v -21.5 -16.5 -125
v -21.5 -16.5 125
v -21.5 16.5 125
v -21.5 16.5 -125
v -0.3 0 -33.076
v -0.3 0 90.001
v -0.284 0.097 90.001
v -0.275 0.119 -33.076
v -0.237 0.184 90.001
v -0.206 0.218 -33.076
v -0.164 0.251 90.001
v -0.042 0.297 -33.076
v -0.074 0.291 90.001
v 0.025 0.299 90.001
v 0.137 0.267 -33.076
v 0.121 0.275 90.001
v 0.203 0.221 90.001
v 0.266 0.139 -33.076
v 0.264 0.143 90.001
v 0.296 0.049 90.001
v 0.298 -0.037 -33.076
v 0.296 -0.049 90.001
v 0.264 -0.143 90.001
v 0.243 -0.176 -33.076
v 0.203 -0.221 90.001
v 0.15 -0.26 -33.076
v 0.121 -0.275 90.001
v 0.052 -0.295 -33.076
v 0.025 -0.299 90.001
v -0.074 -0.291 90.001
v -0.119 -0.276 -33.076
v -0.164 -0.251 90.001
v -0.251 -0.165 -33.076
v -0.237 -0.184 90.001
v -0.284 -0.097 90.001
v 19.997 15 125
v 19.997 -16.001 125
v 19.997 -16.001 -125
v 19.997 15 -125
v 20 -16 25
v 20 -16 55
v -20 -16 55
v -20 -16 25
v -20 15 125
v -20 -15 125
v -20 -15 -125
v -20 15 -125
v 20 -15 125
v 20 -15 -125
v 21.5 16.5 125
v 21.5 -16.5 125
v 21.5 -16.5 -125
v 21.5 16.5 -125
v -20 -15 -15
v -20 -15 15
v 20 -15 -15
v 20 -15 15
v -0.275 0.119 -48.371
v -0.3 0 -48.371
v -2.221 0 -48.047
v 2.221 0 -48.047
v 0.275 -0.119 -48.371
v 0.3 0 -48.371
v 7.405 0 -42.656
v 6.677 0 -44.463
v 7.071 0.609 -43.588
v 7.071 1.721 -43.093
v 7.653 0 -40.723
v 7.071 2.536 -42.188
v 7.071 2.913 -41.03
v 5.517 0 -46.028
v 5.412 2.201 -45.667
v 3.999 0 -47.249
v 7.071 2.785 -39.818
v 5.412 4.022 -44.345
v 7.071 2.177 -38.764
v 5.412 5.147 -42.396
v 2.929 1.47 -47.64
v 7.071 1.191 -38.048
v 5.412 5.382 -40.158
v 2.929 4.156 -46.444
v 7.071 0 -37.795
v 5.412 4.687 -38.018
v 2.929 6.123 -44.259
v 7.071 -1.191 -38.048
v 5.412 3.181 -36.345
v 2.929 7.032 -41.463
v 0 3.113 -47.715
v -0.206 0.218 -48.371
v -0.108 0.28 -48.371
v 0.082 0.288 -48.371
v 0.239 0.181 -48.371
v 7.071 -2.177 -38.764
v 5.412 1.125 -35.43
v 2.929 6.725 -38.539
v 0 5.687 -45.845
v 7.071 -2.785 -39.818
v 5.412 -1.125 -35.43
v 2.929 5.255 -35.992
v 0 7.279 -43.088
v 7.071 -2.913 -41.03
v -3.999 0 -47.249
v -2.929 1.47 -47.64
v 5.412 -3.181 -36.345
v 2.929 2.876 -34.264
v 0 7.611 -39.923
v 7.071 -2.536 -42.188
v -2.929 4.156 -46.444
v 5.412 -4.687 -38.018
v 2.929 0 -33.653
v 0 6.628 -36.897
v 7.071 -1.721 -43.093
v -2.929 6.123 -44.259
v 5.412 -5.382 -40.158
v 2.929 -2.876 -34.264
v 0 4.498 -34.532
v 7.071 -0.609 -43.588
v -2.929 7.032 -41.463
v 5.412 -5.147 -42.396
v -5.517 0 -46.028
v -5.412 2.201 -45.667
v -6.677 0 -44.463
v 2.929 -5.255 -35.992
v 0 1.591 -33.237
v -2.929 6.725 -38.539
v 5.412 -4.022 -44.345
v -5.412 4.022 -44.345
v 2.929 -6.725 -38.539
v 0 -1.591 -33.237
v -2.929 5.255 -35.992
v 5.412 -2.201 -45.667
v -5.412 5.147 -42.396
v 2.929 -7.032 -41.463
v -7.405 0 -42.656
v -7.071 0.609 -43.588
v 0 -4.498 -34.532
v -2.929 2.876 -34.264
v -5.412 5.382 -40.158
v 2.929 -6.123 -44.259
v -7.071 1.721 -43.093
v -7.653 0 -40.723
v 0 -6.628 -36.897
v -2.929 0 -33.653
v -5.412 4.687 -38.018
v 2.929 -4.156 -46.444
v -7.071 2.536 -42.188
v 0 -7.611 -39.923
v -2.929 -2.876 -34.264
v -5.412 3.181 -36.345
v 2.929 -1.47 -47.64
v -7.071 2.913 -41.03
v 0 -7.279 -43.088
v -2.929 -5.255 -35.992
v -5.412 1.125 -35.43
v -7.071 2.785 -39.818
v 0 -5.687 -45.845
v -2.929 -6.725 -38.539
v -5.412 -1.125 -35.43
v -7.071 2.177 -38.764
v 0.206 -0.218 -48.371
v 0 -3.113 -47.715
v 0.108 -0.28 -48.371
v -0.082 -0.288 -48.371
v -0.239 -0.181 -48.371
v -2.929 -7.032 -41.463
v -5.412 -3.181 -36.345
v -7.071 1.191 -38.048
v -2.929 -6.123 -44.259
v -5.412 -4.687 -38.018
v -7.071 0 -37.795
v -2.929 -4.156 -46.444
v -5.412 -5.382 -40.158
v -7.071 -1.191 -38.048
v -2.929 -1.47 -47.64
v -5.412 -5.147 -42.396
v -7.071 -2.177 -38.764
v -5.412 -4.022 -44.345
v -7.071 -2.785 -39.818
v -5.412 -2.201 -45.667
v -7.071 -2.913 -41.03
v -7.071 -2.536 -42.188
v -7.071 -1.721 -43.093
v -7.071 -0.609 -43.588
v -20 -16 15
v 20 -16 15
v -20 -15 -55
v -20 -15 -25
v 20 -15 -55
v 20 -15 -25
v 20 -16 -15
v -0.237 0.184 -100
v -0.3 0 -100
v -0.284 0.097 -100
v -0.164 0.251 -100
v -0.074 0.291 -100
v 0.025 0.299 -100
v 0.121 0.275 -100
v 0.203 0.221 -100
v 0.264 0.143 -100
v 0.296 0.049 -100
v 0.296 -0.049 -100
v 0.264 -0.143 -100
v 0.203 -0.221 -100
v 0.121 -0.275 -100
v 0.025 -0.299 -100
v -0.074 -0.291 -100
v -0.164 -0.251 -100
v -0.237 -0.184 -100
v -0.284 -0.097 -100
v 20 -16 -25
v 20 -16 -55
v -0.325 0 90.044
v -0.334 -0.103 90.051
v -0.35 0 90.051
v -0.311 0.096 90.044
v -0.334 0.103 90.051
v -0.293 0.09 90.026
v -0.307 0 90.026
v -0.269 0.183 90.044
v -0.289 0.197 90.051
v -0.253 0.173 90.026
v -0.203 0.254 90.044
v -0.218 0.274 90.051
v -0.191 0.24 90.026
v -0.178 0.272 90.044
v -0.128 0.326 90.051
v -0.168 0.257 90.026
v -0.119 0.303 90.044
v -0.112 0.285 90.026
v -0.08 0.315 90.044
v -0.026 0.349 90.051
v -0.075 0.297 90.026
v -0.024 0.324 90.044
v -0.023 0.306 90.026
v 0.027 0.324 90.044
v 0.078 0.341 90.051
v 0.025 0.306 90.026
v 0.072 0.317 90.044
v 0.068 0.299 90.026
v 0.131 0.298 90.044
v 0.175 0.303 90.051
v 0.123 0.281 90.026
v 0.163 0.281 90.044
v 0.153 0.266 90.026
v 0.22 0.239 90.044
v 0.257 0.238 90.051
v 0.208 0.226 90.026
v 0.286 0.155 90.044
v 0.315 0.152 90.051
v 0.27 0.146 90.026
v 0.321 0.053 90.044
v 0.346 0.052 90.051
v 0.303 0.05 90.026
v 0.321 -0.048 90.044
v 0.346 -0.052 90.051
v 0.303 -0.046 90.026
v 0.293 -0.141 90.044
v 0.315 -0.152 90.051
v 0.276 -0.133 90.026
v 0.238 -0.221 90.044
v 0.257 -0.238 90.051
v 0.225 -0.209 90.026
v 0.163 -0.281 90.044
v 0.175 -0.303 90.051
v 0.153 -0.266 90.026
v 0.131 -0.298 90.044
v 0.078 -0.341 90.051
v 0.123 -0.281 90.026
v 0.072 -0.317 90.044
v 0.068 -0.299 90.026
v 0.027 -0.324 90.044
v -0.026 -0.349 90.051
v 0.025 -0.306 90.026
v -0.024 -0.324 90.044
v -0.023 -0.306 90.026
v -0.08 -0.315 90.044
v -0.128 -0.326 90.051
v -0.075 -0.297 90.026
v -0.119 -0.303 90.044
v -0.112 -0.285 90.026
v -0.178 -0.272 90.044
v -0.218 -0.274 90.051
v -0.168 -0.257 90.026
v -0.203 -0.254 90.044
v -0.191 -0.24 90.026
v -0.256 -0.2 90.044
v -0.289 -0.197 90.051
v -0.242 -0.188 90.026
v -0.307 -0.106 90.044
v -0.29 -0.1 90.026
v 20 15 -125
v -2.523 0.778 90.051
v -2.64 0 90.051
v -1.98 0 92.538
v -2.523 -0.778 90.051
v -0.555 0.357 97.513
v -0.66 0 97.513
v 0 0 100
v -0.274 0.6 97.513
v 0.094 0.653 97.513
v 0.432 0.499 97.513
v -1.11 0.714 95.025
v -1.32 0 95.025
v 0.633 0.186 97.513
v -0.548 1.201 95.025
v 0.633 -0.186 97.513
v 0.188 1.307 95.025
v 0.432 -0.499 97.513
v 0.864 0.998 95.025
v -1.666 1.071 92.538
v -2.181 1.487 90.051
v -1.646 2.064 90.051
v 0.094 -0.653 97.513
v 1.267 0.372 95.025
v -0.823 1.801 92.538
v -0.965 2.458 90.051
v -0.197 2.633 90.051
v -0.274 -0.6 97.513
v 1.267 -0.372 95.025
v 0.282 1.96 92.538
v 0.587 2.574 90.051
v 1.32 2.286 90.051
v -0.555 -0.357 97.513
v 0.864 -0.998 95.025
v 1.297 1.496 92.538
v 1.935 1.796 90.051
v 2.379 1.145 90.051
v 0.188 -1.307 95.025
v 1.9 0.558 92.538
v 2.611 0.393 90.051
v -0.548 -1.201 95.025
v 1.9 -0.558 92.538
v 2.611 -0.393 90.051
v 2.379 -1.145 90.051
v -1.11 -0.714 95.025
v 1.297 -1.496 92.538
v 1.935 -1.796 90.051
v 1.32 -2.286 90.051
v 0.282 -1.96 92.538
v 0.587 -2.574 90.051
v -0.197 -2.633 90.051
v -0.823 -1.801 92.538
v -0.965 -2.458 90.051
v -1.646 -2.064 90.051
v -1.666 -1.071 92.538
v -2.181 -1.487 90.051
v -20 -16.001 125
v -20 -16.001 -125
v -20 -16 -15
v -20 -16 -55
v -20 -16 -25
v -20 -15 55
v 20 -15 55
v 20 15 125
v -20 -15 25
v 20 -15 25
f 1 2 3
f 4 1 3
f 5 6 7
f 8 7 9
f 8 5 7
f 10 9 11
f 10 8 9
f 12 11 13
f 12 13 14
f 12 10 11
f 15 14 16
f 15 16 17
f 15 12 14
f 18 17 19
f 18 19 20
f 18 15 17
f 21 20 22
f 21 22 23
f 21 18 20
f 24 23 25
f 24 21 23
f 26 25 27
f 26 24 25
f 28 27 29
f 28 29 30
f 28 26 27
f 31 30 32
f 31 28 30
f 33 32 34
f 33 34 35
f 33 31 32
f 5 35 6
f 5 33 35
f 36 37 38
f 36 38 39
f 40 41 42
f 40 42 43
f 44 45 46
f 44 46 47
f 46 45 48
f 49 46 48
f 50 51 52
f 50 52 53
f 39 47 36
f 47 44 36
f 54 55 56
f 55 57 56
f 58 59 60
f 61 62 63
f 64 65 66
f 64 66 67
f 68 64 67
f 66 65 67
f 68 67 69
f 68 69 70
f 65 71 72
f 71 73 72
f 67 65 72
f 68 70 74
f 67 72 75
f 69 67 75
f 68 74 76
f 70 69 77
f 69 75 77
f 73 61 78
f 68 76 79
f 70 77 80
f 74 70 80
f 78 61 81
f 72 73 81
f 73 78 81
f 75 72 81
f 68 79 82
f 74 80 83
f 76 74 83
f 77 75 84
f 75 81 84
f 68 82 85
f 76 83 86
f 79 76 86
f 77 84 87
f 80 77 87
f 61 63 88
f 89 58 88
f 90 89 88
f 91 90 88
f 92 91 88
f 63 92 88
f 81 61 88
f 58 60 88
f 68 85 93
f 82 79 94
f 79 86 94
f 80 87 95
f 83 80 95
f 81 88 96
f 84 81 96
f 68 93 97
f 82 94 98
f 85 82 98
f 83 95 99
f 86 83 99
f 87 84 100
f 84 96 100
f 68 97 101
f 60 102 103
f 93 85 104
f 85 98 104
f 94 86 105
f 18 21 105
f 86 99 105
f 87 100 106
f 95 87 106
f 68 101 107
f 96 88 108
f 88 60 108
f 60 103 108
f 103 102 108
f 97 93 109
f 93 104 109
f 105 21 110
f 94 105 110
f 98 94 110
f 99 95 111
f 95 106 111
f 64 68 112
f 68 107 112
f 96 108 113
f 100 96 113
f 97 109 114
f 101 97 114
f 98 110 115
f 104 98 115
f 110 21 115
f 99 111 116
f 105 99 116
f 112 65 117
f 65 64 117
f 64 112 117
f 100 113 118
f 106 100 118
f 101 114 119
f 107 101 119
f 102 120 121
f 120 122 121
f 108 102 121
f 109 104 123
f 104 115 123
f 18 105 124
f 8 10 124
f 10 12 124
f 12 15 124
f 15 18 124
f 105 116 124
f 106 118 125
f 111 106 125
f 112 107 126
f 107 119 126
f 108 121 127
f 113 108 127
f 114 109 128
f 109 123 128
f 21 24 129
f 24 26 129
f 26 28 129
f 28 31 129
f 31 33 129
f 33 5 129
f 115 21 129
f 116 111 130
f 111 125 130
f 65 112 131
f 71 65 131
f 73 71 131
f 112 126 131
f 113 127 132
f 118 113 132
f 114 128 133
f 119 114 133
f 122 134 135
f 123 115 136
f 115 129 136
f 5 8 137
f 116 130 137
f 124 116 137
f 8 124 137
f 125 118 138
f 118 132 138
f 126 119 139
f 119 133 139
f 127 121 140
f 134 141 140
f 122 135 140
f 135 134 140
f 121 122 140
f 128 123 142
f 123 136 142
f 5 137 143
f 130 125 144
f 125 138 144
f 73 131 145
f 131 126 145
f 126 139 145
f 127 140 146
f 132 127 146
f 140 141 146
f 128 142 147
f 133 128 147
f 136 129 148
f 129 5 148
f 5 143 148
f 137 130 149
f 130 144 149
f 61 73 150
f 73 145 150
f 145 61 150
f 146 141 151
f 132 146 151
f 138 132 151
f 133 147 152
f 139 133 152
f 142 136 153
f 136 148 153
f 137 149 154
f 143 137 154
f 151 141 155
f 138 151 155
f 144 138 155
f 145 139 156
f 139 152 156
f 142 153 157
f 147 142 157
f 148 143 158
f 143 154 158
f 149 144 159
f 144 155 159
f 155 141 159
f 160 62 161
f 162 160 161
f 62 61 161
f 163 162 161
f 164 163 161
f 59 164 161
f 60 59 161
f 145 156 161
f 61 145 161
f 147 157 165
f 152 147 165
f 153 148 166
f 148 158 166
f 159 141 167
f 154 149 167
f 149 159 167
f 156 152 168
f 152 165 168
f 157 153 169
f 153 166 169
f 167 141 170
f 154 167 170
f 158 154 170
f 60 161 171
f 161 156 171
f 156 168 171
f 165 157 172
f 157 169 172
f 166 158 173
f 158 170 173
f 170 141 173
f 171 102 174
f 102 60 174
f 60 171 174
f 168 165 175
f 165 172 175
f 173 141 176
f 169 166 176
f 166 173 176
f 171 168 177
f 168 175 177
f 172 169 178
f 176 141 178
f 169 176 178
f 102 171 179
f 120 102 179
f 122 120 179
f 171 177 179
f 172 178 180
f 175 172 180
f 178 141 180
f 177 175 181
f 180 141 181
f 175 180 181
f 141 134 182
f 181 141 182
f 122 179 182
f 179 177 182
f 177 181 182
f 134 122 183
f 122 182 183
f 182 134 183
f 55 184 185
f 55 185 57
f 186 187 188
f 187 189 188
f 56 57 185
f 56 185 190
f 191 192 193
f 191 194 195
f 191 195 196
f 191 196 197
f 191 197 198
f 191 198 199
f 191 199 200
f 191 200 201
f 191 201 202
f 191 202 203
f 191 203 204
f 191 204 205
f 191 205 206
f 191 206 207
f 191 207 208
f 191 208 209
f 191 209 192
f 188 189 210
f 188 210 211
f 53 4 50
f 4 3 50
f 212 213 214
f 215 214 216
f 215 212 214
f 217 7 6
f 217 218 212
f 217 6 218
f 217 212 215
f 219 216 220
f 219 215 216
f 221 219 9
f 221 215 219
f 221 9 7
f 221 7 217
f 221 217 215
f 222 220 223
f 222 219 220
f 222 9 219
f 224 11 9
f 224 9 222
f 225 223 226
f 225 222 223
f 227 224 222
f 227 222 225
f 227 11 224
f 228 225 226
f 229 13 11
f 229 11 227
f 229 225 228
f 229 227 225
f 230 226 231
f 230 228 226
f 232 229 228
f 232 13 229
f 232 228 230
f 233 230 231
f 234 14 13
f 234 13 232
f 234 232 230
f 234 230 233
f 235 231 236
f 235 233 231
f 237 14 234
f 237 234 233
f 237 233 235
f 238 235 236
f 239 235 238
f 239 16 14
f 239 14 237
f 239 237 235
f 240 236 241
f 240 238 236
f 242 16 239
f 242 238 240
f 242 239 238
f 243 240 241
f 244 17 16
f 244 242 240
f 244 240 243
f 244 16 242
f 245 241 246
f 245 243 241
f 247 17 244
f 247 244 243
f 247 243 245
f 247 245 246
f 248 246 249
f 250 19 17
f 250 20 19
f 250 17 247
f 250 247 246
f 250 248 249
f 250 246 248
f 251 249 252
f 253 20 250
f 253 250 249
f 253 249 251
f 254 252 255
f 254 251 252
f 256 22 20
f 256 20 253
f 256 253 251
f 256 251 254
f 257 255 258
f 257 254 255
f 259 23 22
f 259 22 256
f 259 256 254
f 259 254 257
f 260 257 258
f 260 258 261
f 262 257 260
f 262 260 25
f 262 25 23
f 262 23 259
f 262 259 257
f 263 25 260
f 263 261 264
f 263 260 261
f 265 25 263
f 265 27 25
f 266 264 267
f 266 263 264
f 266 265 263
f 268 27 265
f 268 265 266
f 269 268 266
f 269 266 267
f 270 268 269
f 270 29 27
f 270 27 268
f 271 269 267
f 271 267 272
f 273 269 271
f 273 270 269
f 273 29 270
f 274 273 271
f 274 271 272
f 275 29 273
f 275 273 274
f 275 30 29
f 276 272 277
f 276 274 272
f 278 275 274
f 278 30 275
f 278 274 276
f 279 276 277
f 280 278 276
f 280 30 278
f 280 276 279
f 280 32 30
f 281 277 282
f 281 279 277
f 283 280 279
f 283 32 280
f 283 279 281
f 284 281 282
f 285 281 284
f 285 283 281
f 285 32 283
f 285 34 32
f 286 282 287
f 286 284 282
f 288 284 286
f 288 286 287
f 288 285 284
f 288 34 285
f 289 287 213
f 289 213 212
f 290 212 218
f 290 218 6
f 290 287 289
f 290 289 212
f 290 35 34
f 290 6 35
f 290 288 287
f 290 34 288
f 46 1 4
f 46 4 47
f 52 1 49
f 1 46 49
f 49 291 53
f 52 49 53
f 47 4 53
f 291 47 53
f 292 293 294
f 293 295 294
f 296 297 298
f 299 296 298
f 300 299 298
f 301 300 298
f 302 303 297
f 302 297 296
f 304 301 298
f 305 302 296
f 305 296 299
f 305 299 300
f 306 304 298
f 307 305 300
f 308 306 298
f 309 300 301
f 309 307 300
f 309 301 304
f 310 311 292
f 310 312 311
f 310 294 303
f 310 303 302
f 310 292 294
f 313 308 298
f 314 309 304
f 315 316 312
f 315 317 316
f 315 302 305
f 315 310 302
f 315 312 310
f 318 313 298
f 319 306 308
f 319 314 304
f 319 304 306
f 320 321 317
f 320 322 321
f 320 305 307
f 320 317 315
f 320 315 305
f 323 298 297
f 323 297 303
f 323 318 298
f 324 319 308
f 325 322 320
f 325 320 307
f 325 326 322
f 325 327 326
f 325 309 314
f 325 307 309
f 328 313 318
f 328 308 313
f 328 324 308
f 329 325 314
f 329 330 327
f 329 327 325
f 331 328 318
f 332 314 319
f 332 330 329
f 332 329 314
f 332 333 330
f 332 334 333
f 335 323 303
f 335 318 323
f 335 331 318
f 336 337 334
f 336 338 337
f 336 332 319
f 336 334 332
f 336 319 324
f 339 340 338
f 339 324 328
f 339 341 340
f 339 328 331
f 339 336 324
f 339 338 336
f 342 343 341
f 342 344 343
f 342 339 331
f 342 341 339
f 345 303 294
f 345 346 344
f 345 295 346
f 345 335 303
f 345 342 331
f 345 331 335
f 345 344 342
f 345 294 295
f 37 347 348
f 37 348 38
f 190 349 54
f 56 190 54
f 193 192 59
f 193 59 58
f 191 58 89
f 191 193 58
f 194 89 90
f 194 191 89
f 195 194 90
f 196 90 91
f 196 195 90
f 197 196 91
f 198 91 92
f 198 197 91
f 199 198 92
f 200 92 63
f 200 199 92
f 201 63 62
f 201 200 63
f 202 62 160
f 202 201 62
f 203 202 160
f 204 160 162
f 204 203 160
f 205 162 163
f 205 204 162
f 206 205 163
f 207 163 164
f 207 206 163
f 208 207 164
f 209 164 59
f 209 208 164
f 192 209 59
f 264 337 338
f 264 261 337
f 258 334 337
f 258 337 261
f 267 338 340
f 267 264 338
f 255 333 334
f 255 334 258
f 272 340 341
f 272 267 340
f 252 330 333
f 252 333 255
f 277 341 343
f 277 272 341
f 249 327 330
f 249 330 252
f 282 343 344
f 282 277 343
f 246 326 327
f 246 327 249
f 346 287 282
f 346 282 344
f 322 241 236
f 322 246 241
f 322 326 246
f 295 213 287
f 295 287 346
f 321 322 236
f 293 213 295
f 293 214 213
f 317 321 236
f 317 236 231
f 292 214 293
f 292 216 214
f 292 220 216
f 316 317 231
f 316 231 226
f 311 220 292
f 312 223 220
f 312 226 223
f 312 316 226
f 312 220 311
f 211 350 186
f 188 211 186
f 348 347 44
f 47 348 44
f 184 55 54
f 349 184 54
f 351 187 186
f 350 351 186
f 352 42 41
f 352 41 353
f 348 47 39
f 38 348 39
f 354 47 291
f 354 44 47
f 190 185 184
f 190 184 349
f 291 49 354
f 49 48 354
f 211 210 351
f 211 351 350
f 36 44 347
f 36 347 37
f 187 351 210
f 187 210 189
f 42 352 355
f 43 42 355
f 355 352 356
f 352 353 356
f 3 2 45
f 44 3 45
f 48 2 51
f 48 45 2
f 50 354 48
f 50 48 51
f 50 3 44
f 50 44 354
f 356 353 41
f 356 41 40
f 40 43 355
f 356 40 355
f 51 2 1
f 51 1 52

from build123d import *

# Parameters (mm, degrees)
SKETCH1_W             = 43
SKETCH1_H             = 33
SKETCH1_W_2           = 40
SKETCH1_H_2           = 30
EXTRUDE_THIN1_DEPTH   = 125
SKETCH2_W             = 30
SKETCH2_H             = 1
BOSS_EXTRUDE1_DEPTH   = 20
BOSS_EXTRUDE1_2_DEPTH = 20
BOSS_EXTRUDE1_3_DEPTH = 20
SKETCH6_W             = 39.996661802
SKETCH6_H             = 31.000580386
BOSS_EXTRUDE2_DEPTH   = 125


with BuildPart() as part:
    # Sketch1 → Extrude-Thin1 (new body, symmetric)
    with BuildSketch(Plane.XY):
        Rectangle(SKETCH1_W, SKETCH1_H)
        Rectangle(SKETCH1_W_2, SKETCH1_H_2, mode=Mode.SUBTRACT)
    extrude(amount=EXTRUDE_THIN1_DEPTH, both=True)


with BuildPart() as body_2:
    # Sketch2 → Boss-Extrude1 (new body, symmetric)
    with BuildSketch(Plane(origin=(0, 0, 0), x_dir=(0, 0, -1), z_dir=(1, 0, 0))):
        with Locations((0, -15.5)):
            Rectangle(SKETCH2_W, SKETCH2_H)
    extrude(amount=BOSS_EXTRUDE1_DEPTH, both=True)


with BuildPart() as body_3:
    # Sketch2 → Boss-Extrude1 2 (new body, symmetric)
    with BuildSketch(Plane(origin=(0, 0, 0), x_dir=(0, 0, -1), z_dir=(1, 0, 0))):
        with Locations((-40, -15.5)):
            Rectangle(SKETCH2_W, SKETCH2_H)
    extrude(amount=BOSS_EXTRUDE1_2_DEPTH, both=True)


with BuildPart() as body_4:
    # Sketch2 → Boss-Extrude1 3 (new body, symmetric)
    with BuildSketch(Plane(origin=(0, 0, 0), x_dir=(0, 0, -1), z_dir=(1, 0, 0))):
        with Locations((40, -15.5)):
            Rectangle(SKETCH2_W, SKETCH2_H)
    extrude(amount=BOSS_EXTRUDE1_3_DEPTH, both=True)


with BuildPart() as body_5:
    # Sketch3 → Revolve1 (revolve)
    with BuildSketch(Plane(origin=(0, 0, 0), x_dir=(1, 0, 0), z_dir=(0, 1, 0))):
        with BuildLine():
            Line((-7.65326093, 40.723479344), (7.65326093, 40.723479344))
            ThreePointArc((7.65326093, 40.723479344), (0, 48.376740274), (-7.65326093, 40.723479344))
        make_face()
    revolve(axis=Axis((-7.65326093, 0, -40.723479344), (1, 0, 0)))

    # Sketch5 → Revolve2 (revolve)
    with BuildSketch(Plane(origin=(0, 0, 0), x_dir=(1, 0, 0), z_dir=(0, 1, 0))):
        with BuildLine():
            Line((0, -100), (-2.640084996, -90.050652638))
            Line((-2.640084996, -90.050652638), (-0.35, -90.050652638))
            ThreePointArc((-0.35, -90.050652638), (-0.314644661, -90.036007977), (-0.3, -90.000652638))
            Line((-0.3, -90.000652638), (-0.3, 100))
            Line((-0.3, 100), (0, 100))
            Line((0, 100), (0, -100))
        make_face()
    revolve(axis=Axis((0, 0, 100), (0, 0, -1)))


with BuildPart() as body_6:
    # Sketch6 → Boss-Extrude2 (new body, symmetric)
    with BuildSketch(Plane.XY):
        with Locations((-0.001669099, -0.500290193)):
            Rectangle(SKETCH6_W, SKETCH6_H)
    extrude(amount=BOSS_EXTRUDE2_DEPTH, both=True)


solid = Compound([part.part, body_2.part, body_3.part, body_4.part, body_5.part, body_6.part])
